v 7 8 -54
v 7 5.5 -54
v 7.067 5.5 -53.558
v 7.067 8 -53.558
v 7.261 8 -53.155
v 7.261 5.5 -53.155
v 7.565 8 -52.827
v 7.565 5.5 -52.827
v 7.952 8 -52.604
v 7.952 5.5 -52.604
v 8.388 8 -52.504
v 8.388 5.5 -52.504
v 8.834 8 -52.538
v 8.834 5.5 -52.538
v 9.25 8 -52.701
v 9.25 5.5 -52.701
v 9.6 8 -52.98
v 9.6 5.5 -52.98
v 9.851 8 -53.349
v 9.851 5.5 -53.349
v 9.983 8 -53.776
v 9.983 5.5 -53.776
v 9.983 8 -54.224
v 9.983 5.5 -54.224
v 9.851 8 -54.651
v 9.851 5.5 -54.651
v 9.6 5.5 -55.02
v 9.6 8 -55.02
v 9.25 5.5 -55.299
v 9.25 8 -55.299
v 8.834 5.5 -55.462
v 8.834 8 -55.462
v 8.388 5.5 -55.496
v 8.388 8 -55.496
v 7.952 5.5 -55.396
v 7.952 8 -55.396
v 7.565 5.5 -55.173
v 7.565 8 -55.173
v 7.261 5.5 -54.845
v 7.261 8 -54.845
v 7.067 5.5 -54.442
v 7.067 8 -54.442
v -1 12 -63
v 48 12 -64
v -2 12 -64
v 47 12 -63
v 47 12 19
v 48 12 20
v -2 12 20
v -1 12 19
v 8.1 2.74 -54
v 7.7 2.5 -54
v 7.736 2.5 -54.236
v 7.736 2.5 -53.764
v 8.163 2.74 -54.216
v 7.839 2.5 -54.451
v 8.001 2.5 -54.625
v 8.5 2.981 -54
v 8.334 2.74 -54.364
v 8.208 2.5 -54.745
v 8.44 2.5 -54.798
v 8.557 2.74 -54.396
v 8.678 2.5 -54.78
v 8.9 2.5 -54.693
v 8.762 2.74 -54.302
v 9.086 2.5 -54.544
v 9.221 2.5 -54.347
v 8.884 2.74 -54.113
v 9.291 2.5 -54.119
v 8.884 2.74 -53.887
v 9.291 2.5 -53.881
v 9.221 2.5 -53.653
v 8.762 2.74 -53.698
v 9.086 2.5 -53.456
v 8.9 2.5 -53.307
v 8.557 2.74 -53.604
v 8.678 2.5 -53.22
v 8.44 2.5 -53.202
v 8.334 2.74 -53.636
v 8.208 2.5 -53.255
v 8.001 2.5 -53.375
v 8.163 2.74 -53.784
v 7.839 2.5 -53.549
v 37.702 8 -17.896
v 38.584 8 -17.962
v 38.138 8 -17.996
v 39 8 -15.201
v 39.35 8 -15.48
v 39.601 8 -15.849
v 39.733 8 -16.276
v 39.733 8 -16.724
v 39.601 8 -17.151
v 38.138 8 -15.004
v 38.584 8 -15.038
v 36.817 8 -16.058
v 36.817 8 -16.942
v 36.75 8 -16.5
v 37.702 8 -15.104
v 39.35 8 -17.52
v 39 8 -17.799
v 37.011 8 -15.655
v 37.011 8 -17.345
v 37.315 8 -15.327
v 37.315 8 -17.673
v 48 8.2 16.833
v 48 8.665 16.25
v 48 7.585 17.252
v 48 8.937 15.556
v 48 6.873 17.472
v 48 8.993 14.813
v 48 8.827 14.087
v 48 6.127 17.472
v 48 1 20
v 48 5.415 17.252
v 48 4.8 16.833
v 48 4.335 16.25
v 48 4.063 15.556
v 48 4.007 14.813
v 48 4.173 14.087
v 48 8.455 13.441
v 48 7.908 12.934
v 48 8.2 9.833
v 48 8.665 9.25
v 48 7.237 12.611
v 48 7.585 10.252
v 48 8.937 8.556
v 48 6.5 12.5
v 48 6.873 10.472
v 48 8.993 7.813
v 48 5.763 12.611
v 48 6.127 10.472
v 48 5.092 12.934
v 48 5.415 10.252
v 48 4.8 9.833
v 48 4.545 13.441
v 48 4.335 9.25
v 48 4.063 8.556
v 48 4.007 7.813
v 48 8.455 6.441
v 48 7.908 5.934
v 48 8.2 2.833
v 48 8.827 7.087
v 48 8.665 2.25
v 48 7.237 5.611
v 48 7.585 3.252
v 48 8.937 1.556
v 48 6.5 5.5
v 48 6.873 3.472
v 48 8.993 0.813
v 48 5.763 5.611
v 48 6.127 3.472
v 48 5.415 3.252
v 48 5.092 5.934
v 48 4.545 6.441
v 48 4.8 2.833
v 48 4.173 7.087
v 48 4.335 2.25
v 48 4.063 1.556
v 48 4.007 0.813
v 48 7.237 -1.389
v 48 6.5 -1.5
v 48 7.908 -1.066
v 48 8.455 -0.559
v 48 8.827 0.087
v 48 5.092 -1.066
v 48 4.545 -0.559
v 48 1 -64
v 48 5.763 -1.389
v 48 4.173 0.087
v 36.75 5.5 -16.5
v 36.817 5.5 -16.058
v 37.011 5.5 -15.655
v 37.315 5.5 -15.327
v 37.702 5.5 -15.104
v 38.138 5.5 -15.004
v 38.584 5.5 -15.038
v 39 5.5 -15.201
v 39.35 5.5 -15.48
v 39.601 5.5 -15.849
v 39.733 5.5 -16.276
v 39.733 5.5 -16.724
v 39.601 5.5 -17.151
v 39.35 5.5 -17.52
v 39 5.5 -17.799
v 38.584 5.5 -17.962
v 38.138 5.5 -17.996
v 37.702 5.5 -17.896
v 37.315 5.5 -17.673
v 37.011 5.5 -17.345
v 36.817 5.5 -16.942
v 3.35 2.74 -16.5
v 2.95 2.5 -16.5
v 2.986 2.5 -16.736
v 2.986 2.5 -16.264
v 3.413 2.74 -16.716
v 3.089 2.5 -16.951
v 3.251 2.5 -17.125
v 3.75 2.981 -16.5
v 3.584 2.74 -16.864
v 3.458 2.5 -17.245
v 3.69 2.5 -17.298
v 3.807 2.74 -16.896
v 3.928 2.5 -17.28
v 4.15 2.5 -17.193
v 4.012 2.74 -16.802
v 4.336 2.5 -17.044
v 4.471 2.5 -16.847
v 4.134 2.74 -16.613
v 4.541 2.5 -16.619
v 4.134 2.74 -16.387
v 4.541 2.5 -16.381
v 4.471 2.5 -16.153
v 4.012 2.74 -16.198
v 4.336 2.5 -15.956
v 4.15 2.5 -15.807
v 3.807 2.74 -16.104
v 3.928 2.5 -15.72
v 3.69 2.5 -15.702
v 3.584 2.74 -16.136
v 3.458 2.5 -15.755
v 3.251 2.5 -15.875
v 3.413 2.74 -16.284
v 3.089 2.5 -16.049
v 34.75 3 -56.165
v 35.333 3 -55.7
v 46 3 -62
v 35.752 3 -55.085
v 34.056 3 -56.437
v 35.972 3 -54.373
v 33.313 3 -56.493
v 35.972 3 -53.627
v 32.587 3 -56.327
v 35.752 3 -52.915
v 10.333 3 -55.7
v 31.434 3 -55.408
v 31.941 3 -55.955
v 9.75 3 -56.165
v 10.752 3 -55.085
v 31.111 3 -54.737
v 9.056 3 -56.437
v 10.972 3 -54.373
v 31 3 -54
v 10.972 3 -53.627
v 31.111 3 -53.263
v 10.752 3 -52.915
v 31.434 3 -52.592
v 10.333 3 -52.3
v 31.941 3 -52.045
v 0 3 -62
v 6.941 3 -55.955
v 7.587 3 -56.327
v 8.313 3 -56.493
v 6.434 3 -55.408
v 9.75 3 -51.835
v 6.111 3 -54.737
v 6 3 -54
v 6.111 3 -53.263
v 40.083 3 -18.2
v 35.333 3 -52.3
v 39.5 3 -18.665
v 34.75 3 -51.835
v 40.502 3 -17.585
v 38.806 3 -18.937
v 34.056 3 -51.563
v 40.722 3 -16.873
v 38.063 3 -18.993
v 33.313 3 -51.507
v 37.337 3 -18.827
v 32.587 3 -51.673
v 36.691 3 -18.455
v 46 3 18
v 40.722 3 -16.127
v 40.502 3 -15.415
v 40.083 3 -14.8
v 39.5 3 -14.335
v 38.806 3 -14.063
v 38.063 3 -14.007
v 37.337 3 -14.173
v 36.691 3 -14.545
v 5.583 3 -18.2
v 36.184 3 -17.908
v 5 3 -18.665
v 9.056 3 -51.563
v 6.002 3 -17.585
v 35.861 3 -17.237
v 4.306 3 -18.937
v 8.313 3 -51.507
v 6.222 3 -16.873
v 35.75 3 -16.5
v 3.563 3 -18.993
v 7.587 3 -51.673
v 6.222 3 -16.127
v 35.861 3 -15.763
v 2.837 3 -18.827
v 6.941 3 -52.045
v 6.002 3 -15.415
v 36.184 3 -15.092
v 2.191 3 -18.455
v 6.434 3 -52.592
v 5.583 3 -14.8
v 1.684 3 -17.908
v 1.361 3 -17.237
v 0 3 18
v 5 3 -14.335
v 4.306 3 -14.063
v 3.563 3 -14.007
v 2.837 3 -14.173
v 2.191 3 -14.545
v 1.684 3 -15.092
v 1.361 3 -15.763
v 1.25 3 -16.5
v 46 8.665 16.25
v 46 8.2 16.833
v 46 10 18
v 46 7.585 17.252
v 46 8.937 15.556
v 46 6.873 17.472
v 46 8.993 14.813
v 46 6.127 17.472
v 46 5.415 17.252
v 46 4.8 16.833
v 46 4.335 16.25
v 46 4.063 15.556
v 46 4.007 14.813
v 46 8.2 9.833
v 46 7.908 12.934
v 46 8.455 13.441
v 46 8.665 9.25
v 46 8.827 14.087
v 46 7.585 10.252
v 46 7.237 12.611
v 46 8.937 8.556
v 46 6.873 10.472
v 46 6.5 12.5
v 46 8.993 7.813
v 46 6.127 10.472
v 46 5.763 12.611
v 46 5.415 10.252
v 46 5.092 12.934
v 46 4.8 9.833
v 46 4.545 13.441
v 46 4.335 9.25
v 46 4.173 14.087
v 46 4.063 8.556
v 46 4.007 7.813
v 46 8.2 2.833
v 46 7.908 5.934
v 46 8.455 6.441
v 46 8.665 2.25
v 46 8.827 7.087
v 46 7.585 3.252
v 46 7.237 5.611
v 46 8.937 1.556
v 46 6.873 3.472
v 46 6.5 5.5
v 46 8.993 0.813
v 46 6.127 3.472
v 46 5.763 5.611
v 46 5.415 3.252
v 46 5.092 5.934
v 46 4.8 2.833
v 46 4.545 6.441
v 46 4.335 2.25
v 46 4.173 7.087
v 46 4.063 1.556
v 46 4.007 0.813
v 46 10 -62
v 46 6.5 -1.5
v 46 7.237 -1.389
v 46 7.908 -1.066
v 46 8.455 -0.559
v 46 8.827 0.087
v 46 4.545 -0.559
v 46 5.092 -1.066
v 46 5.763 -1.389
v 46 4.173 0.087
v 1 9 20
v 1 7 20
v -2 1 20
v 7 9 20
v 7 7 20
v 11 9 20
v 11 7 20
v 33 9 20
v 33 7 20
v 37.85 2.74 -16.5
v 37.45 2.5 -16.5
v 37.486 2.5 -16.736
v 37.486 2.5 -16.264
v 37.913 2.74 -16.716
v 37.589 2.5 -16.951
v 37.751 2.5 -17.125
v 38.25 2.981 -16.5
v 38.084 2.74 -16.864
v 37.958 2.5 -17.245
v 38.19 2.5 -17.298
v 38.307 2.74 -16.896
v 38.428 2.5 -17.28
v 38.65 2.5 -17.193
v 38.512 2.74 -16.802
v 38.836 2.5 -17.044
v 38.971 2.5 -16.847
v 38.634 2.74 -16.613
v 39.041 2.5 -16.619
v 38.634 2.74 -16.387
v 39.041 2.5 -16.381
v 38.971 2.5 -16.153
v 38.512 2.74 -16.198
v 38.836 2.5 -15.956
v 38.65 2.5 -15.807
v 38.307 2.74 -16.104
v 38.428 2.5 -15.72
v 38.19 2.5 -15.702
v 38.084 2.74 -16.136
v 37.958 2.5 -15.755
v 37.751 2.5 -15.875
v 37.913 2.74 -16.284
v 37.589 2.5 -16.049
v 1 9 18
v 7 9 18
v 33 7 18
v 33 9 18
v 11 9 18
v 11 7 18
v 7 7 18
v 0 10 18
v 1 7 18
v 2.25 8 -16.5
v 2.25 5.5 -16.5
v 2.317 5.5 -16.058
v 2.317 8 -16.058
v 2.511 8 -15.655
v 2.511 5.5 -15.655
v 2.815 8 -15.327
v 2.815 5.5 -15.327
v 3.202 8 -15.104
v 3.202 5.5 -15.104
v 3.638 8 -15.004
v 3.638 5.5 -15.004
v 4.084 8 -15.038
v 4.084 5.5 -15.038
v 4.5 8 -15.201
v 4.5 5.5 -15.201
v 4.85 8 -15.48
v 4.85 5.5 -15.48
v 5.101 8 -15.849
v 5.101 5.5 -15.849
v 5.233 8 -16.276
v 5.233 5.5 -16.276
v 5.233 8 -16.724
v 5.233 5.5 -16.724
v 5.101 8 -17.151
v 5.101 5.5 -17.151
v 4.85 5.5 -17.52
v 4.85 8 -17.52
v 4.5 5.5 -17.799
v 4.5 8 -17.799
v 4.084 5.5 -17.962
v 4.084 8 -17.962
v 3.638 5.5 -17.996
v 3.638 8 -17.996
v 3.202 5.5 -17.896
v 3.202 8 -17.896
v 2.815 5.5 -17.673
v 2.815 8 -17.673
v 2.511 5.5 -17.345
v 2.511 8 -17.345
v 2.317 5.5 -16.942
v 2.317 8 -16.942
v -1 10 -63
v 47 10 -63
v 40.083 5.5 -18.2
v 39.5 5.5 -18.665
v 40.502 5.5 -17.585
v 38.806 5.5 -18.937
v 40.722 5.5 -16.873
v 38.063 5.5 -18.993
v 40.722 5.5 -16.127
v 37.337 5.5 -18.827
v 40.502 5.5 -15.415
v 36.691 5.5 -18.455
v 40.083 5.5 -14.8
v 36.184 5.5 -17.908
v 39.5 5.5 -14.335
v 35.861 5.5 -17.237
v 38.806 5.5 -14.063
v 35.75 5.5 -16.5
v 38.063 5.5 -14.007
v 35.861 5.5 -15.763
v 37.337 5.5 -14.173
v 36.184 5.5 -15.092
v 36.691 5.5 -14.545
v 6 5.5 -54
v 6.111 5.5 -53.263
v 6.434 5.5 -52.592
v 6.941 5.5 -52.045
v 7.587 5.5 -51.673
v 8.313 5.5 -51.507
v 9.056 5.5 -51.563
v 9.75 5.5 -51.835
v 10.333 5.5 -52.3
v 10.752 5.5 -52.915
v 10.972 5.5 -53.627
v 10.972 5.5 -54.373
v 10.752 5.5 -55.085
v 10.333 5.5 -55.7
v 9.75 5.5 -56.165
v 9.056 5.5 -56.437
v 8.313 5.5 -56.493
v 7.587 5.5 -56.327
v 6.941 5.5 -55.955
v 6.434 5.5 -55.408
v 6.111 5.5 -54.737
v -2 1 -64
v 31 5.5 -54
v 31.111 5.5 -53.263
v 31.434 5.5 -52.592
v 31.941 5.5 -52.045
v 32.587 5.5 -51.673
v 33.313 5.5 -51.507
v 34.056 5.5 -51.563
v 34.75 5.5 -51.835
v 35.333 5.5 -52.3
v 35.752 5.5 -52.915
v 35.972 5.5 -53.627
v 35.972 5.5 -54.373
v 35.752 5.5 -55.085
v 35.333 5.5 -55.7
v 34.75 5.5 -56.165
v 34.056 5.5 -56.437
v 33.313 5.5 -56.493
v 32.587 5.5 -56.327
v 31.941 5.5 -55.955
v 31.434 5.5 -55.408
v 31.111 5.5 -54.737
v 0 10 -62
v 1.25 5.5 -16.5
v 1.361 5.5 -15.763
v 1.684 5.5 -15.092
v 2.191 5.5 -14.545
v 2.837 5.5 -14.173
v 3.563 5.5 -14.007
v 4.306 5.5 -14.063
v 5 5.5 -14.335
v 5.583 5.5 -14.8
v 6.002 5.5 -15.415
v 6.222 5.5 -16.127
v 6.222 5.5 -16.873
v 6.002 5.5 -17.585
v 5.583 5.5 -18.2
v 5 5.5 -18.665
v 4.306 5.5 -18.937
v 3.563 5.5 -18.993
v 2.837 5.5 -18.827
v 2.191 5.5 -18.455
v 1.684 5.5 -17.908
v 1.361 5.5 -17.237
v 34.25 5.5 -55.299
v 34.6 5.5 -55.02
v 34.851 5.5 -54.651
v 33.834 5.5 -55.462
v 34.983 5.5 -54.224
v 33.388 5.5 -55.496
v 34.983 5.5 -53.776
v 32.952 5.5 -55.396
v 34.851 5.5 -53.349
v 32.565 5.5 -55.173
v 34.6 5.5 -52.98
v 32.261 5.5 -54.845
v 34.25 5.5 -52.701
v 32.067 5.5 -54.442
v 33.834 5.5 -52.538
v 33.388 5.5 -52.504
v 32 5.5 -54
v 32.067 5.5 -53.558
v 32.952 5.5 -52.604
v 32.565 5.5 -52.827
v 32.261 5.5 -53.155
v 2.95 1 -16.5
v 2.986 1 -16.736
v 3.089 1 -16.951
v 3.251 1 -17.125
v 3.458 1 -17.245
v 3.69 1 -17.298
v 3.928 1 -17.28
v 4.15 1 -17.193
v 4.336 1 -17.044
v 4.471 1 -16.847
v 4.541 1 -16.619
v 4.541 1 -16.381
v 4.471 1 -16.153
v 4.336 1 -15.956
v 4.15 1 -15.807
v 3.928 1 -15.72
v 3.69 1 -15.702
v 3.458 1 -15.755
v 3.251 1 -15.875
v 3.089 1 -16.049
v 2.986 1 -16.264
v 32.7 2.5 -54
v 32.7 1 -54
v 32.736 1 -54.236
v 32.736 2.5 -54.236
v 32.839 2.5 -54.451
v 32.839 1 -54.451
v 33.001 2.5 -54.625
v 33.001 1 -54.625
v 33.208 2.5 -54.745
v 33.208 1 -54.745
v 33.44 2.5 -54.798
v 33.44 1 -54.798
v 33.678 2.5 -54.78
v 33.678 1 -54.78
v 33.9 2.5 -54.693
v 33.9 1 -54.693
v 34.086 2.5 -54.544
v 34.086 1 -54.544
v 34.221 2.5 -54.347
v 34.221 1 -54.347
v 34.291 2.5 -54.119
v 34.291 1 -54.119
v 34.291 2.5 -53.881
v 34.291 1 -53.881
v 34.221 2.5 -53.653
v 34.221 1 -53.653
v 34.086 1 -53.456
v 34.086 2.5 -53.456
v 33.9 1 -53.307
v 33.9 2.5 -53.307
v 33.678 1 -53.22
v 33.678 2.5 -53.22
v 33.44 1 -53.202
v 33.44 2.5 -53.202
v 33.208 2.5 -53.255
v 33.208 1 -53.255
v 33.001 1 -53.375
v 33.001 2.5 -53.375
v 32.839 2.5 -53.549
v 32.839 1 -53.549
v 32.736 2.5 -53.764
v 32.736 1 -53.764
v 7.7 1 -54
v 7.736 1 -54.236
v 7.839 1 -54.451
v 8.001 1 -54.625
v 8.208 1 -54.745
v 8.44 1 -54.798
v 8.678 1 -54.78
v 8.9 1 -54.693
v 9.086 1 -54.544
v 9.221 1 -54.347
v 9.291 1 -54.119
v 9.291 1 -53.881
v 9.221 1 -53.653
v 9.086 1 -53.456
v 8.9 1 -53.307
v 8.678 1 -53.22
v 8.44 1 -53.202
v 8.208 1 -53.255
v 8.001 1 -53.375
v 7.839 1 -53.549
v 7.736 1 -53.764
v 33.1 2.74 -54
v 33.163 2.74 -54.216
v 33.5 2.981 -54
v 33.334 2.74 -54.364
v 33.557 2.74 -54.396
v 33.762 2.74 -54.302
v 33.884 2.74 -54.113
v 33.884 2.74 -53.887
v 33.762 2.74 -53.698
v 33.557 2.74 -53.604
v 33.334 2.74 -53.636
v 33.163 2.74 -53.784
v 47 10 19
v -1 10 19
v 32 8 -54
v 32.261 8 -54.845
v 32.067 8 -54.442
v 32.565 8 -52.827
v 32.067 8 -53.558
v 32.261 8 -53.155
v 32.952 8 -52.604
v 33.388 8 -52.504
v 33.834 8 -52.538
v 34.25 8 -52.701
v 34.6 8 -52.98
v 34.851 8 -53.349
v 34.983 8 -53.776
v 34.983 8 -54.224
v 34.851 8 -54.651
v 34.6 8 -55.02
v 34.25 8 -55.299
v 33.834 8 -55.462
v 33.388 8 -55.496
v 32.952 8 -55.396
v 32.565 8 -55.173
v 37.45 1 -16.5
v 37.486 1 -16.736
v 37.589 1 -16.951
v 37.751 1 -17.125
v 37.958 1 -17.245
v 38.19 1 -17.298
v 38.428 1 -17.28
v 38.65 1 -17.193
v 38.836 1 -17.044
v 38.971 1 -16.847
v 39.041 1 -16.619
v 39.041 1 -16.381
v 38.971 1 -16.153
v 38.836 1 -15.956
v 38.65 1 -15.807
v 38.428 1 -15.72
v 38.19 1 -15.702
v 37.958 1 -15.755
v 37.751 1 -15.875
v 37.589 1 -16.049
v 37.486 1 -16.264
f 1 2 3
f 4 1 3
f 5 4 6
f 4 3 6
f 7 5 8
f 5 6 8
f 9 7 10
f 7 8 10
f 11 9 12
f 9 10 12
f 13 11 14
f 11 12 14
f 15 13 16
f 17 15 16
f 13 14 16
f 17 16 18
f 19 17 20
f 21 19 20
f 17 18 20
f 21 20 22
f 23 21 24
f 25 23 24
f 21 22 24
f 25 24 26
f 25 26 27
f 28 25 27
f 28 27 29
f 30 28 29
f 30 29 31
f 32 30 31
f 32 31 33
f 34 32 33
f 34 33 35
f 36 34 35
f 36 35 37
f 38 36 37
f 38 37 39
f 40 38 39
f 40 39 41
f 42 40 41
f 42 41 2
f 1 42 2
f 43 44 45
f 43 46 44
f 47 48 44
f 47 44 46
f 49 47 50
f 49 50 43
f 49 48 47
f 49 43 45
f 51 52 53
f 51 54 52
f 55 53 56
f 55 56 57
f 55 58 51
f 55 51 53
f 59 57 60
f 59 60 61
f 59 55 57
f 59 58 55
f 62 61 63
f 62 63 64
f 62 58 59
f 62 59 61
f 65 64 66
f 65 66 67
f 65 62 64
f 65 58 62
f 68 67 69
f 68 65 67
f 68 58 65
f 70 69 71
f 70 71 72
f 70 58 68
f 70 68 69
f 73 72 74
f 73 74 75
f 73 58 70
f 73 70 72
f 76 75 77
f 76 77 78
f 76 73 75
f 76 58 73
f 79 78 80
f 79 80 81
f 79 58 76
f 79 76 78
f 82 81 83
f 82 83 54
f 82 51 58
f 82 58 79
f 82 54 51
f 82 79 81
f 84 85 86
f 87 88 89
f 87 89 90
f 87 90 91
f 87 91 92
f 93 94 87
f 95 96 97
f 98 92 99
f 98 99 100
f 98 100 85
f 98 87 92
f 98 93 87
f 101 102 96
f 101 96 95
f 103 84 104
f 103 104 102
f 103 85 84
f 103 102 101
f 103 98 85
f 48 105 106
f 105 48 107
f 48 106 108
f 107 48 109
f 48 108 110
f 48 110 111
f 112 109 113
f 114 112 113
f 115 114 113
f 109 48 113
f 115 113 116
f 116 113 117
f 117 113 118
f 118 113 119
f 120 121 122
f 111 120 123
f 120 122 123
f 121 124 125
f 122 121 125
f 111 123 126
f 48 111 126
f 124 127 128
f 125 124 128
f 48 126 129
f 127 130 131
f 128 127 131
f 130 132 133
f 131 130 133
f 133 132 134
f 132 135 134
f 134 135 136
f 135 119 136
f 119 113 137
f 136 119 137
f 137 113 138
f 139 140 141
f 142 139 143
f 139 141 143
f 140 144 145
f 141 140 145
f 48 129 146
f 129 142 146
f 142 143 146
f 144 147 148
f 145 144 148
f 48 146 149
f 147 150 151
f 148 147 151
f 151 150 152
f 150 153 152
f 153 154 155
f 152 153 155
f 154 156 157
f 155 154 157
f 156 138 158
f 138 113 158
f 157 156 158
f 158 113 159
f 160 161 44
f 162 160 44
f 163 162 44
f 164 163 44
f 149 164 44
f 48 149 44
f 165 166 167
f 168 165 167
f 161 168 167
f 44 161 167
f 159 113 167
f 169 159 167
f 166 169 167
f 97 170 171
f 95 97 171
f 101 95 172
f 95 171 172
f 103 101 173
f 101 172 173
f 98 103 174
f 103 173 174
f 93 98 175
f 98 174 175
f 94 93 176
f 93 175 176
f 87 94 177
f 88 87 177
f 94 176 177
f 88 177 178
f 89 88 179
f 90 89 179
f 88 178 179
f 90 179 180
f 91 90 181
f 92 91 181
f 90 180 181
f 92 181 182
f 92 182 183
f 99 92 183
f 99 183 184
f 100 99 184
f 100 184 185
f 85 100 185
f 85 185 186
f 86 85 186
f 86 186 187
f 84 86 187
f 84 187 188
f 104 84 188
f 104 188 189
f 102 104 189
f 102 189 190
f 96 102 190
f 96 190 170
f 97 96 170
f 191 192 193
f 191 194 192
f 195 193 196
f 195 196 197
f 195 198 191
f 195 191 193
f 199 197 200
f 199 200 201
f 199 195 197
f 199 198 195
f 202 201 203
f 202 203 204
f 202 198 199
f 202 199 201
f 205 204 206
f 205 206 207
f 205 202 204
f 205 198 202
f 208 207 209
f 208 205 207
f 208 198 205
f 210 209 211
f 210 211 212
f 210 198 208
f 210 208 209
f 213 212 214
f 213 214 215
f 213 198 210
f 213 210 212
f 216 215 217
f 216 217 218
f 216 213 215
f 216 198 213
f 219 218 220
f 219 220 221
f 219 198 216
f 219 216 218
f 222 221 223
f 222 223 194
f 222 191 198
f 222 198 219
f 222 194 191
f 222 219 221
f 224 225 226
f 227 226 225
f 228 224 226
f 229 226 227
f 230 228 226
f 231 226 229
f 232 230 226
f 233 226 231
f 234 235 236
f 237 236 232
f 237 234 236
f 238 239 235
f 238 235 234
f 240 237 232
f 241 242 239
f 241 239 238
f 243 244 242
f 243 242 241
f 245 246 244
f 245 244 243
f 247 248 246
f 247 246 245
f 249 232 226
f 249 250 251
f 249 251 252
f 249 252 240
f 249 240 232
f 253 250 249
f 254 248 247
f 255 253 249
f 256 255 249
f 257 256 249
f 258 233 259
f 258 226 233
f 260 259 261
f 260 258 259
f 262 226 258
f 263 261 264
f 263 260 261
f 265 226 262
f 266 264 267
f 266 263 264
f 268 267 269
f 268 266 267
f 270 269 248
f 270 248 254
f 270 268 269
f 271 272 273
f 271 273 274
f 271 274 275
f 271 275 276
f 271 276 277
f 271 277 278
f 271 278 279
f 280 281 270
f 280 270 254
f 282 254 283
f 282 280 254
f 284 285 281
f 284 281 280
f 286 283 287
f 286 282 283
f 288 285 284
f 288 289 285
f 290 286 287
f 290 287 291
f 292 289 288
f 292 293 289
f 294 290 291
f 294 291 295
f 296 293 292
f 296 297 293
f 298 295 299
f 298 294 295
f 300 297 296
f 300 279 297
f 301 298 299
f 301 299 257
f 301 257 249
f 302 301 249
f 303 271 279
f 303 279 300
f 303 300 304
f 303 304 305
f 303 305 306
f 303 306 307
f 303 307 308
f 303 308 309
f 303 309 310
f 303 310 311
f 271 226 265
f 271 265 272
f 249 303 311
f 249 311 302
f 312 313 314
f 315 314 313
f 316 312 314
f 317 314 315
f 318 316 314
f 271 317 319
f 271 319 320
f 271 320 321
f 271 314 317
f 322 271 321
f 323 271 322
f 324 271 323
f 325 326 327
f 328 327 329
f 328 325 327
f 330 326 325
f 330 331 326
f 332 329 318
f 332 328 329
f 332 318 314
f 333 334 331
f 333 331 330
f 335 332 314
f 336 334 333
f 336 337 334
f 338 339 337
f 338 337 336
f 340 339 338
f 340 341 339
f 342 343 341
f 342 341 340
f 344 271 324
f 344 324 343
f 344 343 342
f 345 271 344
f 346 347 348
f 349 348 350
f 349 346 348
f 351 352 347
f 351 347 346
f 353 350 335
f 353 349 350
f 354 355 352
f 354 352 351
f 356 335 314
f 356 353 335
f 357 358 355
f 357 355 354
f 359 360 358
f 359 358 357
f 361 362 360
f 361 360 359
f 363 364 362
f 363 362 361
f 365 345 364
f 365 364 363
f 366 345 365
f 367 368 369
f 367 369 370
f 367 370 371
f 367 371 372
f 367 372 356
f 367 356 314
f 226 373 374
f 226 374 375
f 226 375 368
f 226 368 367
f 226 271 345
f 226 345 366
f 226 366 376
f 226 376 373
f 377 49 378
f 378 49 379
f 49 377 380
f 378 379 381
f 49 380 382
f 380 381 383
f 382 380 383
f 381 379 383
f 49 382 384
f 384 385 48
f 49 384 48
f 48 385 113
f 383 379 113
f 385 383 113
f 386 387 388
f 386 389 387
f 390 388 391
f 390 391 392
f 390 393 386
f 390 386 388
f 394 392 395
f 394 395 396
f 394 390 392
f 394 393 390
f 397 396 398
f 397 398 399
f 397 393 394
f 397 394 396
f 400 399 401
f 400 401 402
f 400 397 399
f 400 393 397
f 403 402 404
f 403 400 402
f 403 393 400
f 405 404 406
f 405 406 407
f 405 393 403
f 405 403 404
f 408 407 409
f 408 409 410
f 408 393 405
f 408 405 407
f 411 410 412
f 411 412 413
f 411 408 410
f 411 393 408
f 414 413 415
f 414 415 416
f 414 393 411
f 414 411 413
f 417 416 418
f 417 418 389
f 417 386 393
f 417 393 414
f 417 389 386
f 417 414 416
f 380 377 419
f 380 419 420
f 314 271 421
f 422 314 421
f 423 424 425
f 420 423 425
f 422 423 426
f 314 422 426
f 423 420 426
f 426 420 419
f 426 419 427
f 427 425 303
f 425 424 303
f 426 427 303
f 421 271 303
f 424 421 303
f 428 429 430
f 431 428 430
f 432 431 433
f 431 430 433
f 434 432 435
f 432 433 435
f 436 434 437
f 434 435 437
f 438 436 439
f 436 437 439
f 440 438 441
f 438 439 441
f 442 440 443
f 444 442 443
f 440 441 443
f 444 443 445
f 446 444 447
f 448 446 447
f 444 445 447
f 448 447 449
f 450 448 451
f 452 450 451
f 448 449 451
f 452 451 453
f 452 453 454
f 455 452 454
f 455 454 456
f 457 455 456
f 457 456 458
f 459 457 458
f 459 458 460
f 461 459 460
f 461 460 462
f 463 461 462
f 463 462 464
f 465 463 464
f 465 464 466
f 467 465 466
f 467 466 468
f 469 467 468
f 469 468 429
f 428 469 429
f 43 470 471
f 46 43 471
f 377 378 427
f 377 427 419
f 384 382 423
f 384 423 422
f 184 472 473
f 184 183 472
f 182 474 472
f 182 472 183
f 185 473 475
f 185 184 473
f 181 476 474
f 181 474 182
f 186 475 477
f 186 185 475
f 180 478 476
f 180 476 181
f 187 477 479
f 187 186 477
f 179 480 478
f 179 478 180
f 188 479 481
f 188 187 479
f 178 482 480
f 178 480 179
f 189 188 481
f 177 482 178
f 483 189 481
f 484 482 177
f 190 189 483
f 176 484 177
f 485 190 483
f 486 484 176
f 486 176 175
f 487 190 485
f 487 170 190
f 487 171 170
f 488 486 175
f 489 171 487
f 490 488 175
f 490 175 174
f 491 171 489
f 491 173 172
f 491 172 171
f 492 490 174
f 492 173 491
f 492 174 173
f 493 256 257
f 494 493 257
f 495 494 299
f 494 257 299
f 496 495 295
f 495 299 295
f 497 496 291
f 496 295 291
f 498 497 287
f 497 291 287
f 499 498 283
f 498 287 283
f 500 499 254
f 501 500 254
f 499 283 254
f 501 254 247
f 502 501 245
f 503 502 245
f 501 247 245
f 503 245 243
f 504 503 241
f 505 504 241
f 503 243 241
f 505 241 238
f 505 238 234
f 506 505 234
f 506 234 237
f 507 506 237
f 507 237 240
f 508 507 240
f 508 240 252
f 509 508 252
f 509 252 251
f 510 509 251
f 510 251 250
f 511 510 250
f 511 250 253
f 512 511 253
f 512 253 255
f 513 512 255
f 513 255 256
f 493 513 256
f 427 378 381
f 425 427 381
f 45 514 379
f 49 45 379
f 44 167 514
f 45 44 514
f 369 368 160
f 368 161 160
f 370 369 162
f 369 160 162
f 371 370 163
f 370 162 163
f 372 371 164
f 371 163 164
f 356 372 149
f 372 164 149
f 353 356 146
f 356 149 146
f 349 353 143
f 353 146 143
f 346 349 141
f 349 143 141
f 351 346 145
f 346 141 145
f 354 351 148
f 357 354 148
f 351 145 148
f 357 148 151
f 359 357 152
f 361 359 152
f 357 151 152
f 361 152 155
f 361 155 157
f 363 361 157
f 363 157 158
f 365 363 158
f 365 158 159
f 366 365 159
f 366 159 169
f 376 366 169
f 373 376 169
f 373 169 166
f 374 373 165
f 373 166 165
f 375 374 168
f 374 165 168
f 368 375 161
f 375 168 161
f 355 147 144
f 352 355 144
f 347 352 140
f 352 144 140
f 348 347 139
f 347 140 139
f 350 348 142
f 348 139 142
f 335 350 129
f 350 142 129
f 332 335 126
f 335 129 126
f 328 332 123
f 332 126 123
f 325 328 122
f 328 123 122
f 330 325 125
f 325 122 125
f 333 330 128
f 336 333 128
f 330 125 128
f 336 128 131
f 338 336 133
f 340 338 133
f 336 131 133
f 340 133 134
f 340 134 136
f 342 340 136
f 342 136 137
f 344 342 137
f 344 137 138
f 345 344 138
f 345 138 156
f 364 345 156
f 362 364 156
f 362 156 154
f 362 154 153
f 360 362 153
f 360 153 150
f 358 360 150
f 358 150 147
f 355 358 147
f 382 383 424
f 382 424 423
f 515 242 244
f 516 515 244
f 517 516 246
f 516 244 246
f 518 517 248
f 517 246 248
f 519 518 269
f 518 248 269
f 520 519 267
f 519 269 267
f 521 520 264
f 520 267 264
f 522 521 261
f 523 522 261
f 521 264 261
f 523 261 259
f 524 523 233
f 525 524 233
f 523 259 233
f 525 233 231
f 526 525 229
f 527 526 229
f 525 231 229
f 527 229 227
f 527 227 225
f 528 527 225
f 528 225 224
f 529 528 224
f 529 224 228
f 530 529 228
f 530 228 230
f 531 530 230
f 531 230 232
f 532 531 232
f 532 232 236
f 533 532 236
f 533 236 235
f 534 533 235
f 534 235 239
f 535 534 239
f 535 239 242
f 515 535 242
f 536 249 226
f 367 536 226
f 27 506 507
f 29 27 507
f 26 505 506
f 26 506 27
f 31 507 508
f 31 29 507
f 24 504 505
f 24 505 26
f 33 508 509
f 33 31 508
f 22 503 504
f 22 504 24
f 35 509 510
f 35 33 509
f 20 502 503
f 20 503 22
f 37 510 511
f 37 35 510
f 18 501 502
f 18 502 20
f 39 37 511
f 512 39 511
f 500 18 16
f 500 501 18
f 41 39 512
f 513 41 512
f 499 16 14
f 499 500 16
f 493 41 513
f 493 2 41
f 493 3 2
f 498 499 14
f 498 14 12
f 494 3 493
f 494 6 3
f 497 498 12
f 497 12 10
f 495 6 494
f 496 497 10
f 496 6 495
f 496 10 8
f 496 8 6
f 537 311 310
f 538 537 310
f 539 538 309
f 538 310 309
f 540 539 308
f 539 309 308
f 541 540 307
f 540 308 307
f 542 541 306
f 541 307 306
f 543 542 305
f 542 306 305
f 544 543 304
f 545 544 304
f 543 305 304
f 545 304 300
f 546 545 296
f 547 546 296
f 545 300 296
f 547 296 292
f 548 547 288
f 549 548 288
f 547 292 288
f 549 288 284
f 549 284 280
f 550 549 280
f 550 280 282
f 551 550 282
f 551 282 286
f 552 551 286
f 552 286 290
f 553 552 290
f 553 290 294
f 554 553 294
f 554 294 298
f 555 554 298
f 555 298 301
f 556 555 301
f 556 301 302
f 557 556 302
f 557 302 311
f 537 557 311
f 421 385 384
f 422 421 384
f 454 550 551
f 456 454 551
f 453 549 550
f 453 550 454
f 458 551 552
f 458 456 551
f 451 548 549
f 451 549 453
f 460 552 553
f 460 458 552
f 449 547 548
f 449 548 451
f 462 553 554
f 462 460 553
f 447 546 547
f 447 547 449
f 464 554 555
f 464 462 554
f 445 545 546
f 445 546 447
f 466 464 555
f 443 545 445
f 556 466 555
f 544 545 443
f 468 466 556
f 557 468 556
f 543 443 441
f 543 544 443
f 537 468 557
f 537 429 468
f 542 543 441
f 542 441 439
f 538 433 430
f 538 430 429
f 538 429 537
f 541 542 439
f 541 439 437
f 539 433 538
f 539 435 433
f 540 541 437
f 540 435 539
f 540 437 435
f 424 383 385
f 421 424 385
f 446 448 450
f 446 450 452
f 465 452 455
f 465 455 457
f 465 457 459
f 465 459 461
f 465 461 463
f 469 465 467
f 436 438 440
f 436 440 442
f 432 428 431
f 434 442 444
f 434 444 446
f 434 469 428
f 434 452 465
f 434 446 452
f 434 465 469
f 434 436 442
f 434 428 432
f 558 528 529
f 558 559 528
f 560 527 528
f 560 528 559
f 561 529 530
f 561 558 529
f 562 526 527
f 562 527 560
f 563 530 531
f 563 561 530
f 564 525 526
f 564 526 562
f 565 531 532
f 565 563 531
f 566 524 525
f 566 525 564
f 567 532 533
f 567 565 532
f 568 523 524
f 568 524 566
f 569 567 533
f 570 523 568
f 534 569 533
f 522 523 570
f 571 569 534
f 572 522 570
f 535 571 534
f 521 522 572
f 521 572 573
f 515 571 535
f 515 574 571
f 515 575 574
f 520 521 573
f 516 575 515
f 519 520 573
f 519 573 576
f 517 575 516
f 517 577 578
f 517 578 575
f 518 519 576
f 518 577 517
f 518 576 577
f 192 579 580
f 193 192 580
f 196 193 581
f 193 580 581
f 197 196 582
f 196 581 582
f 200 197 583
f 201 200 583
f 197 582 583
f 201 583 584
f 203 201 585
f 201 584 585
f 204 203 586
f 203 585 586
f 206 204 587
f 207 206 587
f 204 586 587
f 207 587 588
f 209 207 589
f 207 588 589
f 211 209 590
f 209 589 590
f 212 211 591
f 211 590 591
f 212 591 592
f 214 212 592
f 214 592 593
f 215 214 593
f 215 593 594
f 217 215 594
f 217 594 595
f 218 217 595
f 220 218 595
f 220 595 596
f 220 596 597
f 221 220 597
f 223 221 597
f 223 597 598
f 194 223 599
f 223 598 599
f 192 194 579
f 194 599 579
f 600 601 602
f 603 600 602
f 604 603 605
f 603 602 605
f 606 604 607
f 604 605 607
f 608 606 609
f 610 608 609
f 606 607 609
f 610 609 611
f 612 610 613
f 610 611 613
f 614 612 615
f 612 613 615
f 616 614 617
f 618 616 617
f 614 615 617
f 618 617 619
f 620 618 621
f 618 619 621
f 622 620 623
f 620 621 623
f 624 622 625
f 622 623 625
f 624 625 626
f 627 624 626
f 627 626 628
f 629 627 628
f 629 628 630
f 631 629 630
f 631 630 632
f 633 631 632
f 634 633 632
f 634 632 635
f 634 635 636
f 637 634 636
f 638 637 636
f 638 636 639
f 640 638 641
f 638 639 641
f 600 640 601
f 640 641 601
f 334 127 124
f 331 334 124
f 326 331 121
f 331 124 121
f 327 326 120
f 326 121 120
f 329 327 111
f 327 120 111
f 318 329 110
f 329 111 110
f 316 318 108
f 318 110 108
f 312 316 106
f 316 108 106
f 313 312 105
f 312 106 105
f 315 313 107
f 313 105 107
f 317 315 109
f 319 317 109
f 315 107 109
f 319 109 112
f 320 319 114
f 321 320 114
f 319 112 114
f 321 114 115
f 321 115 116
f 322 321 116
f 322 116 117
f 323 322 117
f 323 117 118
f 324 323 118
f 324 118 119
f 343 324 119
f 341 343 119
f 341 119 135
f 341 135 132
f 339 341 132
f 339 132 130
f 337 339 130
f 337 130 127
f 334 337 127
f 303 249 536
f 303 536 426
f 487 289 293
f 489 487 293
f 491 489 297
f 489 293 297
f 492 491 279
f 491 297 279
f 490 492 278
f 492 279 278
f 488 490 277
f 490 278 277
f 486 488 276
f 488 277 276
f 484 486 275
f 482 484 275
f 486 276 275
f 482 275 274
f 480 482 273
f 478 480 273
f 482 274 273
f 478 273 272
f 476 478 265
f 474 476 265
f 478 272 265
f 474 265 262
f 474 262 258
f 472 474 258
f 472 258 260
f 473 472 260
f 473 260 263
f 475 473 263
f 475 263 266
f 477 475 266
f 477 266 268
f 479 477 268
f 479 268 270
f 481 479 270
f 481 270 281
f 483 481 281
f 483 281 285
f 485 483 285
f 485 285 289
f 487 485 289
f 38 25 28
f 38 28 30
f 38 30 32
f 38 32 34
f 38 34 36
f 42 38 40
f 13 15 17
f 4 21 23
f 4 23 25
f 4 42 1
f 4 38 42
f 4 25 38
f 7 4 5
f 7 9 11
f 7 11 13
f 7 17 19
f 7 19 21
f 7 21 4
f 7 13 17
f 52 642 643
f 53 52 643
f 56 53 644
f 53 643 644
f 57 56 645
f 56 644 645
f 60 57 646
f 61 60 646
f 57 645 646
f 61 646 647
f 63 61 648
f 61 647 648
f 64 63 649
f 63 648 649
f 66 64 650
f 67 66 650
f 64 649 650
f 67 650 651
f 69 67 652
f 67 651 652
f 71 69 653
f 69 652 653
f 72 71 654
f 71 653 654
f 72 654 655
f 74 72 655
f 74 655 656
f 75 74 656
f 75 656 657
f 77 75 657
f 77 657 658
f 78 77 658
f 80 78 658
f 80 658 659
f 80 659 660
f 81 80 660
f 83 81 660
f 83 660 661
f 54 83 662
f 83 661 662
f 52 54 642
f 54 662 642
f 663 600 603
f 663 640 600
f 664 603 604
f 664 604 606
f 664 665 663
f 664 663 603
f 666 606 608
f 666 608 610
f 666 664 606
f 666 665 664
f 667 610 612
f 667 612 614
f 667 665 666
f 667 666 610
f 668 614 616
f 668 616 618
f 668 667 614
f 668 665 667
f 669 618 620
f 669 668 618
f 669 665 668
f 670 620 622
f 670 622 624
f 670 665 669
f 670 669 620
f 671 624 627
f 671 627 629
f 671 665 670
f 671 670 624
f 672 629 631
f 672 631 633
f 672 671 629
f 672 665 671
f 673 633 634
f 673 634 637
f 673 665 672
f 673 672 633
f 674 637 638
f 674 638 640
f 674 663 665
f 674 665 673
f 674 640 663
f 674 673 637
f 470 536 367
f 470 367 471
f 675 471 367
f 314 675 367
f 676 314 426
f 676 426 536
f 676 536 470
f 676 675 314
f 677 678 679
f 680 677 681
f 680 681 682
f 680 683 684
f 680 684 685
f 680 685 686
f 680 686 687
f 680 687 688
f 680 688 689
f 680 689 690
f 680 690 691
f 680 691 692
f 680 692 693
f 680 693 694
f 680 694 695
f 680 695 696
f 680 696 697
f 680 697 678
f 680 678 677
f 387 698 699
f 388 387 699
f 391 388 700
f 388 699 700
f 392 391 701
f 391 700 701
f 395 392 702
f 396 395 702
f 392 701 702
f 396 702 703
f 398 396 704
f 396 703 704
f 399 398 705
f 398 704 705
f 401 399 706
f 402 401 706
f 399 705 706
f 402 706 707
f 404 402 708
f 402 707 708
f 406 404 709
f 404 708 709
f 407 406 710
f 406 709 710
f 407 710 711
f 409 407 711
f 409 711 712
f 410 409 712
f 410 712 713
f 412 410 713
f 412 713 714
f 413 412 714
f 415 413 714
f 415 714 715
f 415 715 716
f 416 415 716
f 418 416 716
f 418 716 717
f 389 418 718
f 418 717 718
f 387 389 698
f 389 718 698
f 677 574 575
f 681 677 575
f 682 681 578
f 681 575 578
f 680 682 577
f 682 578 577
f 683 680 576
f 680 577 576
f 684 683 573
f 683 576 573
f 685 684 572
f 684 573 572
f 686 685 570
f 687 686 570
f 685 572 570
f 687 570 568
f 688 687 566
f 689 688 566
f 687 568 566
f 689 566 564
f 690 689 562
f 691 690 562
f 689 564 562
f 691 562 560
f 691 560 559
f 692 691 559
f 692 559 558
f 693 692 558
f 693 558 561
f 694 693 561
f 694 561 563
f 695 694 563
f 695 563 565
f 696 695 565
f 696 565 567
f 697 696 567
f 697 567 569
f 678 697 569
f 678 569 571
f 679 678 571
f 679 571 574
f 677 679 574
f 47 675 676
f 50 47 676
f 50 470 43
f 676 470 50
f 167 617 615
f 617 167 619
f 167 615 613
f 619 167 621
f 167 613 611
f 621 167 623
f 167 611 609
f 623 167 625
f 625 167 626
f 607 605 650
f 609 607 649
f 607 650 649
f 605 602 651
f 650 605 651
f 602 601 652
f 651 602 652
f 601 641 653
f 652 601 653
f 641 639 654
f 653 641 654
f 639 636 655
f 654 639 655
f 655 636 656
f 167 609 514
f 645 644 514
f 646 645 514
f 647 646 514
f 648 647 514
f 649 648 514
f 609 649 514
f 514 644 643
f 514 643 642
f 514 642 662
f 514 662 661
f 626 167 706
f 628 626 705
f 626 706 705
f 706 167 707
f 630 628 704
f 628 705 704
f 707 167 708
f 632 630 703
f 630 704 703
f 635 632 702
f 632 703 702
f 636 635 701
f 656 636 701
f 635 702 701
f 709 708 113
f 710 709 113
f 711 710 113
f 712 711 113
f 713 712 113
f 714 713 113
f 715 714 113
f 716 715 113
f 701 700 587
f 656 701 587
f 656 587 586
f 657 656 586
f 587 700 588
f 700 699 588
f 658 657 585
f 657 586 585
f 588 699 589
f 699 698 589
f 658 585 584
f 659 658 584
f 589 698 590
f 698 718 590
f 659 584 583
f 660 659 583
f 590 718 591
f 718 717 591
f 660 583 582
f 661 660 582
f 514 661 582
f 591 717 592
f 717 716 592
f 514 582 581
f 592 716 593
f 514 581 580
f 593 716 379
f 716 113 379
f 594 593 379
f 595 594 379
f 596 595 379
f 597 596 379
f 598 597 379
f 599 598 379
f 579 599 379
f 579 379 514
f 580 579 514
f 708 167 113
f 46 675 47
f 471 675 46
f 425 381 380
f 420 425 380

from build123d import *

# Parameters (mm, degrees)
PAD_DEPTH       = 2
PAD001_DEPTH    = 9
PAD002_DEPTH    = 11
SKETCH005_R     = 2.5
PAD003_DEPTH    = 4.5
SKETCH006_R     = 1.5
PAD004_DEPTH    = 7
SKETCH007_W     = 22
SKETCH007_H     = 2
SKETCH007_W_2   = 6
POCKET_DEPTH    = 5
SKETCH008_R     = 2.5
POCKET001_DEPTH = 5
SKETCH009_R     = 0.8
HOLE_DEPTH      = 1.5
HOLE_TIPS_R     = 0.8


with BuildPart() as part:
    # Sketch002 → Pad (new body)
    with BuildSketch(Plane(origin=(0, 1, 0), x_dir=(-1, 0, 0), z_dir=(0, 1, 0))):
        Polygon((-44, -64), (2, -64), (2, 20), (-44, 20), (-48, 20), (-48, -64), align=None)
    extrude(amount=PAD_DEPTH)

    # Sketch003 → Pad001 (join)
    with BuildSketch(Plane(origin=(0, 1, 0), x_dir=(-1, 0, 0), z_dir=(0, 1, 0))):
        Polygon((-44, -64), (2, -64), (2, 20), (-44, 20), (-48, 20), (-48, -64), align=None)
        Polygon((-42, -62), (0, -62), (0, 18), (-42, 18), (-46, 18), (-46, -62), align=None, mode=Mode.SUBTRACT)
    extrude(amount=PAD001_DEPTH)

    # Sketch004 → Pad002 (join)
    with BuildSketch(Plane(origin=(0, 1, 0), x_dir=(-1, 0, 0), z_dir=(0, 1, 0))):
        Polygon((-44, -64), (2, -64), (2, 20), (-44, 20), (-48, 20), (-48, -64), align=None)
        Polygon((-43, -63), (1, -63), (1, 19), (-43, 19), (-47, 19), (-47, -63), align=None, mode=Mode.SUBTRACT)
    extrude(amount=PAD002_DEPTH)

    # Sketch005 → Pad003 (join)
    with BuildSketch(Plane(origin=(0, 1, 0), x_dir=(-1, 0, 0), z_dir=(0, 1, 0))):
        with Locations((-38.250001, -16.5)):
            Circle(SKETCH005_R)
        with Locations((-3.75, -16.5)):
            Circle(SKETCH005_R)
        with Locations((-33.499998, -54)):
            Circle(SKETCH005_R)
        with Locations((-8.499999, -53.999999)):
            Circle(SKETCH005_R)
    extrude(amount=PAD003_DEPTH)

    # Sketch006 → Pad004 (join)
    with BuildSketch(Plane(origin=(0, 1, 0), x_dir=(-1, 0, 0), z_dir=(0, 1, 0))):
        with Locations((-3.75, -16.5)):
            Circle(SKETCH006_R)
        with Locations((-38.250001, -16.5)):
            Circle(SKETCH006_R)
        with Locations((-8.499999, -53.999999)):
            Circle(SKETCH006_R)
        with Locations((-33.499998, -54)):
            Circle(SKETCH006_R)
    extrude(amount=PAD004_DEPTH)

    # Sketch007 (on Face15 of Pad004) → Pocket (cut)
    with BuildSketch(Plane(origin=(0, 1, 20), x_dir=(1, 0, 0), z_dir=(0, 0, 1))):
        with Locations((22, 7)):
            Rectangle(SKETCH007_W, SKETCH007_H)
        with Locations((4, 7)):
            Rectangle(SKETCH007_W_2, SKETCH007_H)
    extrude(amount=-POCKET_DEPTH, mode=Mode.SUBTRACT)

    # Sketch008 (on Face13 of Pocket) → Pocket001 (cut, symmetric)
    with BuildSketch(Plane(origin=(48, 1, 0), x_dir=(0, 0, -1), z_dir=(1, 0, 0))):
        with Locations((-15, 5.5)):
            Circle(SKETCH008_R)
        with Locations((-8, 5.5)):
            Circle(SKETCH008_R)
        with Locations((-1, 5.5)):
            Circle(SKETCH008_R)
    extrude(amount=POCKET001_DEPTH, both=True, mode=Mode.SUBTRACT)

    # Sketch009 (on Face18 of Pocket001) → Hole (cut)
    with BuildSketch(Plane(origin=(0, 1, 0), x_dir=(-1, 0, 0), z_dir=(0, -1, 0))):
        with Locations((-33.499998, 54)):
            Circle(SKETCH009_R)
        with Locations((-8.499999, 53.999999)):
            Circle(SKETCH009_R)
        with Locations((-38.250001, 16.5)):
            Circle(SKETCH009_R)
        with Locations((-3.75, 16.5)):
            Circle(SKETCH009_R)
    extrude(amount=-HOLE_DEPTH, mode=Mode.SUBTRACT)

    # Hole tips → Hole tip 1 section 0
    with BuildSketch(Plane(origin=(0, 2.5, 0), x_dir=(-1, 0, 0), z_dir=(0, -1, 0)), mode=Mode.PRIVATE) as hole_tip_1_s0:
        with Locations((-33.499998, 54)):
            Circle(HOLE_TIPS_R)
    loft([hole_tip_1_s0.sketch, Vertex(33.499998, 2.980688, -54)], mode=Mode.SUBTRACT)

    # Hole tips → Hole tip 2 section 0
    with BuildSketch(Plane(origin=(0, 2.5, 0), x_dir=(-1, 0, 0), z_dir=(0, -1, 0)), mode=Mode.PRIVATE) as hole_tip_2_s0:
        with Locations((-8.499999, 53.999999)):
            Circle(HOLE_TIPS_R)
    loft([hole_tip_2_s0.sketch, Vertex(8.499999, 2.980688, -53.999999)], mode=Mode.SUBTRACT)

    # Hole tips → Hole tip 3 section 0
    with BuildSketch(Plane(origin=(0, 2.5, 0), x_dir=(-1, 0, 0), z_dir=(0, -1, 0)), mode=Mode.PRIVATE) as hole_tip_3_s0:
        with Locations((-38.250001, 16.5)):
            Circle(HOLE_TIPS_R)
    loft([hole_tip_3_s0.sketch, Vertex(38.250001, 2.980688, -16.5)], mode=Mode.SUBTRACT)

    # Hole tips → Hole tip 4 section 0
    with BuildSketch(Plane(origin=(0, 2.5, 0), x_dir=(-1, 0, 0), z_dir=(0, -1, 0)), mode=Mode.PRIVATE) as hole_tip_4_s0:
        with Locations((-3.75, 16.5)):
            Circle(HOLE_TIPS_R)
    loft([hole_tip_4_s0.sketch, Vertex(3.75, 2.980688, -16.5)], mode=Mode.SUBTRACT)


solid = part.part
